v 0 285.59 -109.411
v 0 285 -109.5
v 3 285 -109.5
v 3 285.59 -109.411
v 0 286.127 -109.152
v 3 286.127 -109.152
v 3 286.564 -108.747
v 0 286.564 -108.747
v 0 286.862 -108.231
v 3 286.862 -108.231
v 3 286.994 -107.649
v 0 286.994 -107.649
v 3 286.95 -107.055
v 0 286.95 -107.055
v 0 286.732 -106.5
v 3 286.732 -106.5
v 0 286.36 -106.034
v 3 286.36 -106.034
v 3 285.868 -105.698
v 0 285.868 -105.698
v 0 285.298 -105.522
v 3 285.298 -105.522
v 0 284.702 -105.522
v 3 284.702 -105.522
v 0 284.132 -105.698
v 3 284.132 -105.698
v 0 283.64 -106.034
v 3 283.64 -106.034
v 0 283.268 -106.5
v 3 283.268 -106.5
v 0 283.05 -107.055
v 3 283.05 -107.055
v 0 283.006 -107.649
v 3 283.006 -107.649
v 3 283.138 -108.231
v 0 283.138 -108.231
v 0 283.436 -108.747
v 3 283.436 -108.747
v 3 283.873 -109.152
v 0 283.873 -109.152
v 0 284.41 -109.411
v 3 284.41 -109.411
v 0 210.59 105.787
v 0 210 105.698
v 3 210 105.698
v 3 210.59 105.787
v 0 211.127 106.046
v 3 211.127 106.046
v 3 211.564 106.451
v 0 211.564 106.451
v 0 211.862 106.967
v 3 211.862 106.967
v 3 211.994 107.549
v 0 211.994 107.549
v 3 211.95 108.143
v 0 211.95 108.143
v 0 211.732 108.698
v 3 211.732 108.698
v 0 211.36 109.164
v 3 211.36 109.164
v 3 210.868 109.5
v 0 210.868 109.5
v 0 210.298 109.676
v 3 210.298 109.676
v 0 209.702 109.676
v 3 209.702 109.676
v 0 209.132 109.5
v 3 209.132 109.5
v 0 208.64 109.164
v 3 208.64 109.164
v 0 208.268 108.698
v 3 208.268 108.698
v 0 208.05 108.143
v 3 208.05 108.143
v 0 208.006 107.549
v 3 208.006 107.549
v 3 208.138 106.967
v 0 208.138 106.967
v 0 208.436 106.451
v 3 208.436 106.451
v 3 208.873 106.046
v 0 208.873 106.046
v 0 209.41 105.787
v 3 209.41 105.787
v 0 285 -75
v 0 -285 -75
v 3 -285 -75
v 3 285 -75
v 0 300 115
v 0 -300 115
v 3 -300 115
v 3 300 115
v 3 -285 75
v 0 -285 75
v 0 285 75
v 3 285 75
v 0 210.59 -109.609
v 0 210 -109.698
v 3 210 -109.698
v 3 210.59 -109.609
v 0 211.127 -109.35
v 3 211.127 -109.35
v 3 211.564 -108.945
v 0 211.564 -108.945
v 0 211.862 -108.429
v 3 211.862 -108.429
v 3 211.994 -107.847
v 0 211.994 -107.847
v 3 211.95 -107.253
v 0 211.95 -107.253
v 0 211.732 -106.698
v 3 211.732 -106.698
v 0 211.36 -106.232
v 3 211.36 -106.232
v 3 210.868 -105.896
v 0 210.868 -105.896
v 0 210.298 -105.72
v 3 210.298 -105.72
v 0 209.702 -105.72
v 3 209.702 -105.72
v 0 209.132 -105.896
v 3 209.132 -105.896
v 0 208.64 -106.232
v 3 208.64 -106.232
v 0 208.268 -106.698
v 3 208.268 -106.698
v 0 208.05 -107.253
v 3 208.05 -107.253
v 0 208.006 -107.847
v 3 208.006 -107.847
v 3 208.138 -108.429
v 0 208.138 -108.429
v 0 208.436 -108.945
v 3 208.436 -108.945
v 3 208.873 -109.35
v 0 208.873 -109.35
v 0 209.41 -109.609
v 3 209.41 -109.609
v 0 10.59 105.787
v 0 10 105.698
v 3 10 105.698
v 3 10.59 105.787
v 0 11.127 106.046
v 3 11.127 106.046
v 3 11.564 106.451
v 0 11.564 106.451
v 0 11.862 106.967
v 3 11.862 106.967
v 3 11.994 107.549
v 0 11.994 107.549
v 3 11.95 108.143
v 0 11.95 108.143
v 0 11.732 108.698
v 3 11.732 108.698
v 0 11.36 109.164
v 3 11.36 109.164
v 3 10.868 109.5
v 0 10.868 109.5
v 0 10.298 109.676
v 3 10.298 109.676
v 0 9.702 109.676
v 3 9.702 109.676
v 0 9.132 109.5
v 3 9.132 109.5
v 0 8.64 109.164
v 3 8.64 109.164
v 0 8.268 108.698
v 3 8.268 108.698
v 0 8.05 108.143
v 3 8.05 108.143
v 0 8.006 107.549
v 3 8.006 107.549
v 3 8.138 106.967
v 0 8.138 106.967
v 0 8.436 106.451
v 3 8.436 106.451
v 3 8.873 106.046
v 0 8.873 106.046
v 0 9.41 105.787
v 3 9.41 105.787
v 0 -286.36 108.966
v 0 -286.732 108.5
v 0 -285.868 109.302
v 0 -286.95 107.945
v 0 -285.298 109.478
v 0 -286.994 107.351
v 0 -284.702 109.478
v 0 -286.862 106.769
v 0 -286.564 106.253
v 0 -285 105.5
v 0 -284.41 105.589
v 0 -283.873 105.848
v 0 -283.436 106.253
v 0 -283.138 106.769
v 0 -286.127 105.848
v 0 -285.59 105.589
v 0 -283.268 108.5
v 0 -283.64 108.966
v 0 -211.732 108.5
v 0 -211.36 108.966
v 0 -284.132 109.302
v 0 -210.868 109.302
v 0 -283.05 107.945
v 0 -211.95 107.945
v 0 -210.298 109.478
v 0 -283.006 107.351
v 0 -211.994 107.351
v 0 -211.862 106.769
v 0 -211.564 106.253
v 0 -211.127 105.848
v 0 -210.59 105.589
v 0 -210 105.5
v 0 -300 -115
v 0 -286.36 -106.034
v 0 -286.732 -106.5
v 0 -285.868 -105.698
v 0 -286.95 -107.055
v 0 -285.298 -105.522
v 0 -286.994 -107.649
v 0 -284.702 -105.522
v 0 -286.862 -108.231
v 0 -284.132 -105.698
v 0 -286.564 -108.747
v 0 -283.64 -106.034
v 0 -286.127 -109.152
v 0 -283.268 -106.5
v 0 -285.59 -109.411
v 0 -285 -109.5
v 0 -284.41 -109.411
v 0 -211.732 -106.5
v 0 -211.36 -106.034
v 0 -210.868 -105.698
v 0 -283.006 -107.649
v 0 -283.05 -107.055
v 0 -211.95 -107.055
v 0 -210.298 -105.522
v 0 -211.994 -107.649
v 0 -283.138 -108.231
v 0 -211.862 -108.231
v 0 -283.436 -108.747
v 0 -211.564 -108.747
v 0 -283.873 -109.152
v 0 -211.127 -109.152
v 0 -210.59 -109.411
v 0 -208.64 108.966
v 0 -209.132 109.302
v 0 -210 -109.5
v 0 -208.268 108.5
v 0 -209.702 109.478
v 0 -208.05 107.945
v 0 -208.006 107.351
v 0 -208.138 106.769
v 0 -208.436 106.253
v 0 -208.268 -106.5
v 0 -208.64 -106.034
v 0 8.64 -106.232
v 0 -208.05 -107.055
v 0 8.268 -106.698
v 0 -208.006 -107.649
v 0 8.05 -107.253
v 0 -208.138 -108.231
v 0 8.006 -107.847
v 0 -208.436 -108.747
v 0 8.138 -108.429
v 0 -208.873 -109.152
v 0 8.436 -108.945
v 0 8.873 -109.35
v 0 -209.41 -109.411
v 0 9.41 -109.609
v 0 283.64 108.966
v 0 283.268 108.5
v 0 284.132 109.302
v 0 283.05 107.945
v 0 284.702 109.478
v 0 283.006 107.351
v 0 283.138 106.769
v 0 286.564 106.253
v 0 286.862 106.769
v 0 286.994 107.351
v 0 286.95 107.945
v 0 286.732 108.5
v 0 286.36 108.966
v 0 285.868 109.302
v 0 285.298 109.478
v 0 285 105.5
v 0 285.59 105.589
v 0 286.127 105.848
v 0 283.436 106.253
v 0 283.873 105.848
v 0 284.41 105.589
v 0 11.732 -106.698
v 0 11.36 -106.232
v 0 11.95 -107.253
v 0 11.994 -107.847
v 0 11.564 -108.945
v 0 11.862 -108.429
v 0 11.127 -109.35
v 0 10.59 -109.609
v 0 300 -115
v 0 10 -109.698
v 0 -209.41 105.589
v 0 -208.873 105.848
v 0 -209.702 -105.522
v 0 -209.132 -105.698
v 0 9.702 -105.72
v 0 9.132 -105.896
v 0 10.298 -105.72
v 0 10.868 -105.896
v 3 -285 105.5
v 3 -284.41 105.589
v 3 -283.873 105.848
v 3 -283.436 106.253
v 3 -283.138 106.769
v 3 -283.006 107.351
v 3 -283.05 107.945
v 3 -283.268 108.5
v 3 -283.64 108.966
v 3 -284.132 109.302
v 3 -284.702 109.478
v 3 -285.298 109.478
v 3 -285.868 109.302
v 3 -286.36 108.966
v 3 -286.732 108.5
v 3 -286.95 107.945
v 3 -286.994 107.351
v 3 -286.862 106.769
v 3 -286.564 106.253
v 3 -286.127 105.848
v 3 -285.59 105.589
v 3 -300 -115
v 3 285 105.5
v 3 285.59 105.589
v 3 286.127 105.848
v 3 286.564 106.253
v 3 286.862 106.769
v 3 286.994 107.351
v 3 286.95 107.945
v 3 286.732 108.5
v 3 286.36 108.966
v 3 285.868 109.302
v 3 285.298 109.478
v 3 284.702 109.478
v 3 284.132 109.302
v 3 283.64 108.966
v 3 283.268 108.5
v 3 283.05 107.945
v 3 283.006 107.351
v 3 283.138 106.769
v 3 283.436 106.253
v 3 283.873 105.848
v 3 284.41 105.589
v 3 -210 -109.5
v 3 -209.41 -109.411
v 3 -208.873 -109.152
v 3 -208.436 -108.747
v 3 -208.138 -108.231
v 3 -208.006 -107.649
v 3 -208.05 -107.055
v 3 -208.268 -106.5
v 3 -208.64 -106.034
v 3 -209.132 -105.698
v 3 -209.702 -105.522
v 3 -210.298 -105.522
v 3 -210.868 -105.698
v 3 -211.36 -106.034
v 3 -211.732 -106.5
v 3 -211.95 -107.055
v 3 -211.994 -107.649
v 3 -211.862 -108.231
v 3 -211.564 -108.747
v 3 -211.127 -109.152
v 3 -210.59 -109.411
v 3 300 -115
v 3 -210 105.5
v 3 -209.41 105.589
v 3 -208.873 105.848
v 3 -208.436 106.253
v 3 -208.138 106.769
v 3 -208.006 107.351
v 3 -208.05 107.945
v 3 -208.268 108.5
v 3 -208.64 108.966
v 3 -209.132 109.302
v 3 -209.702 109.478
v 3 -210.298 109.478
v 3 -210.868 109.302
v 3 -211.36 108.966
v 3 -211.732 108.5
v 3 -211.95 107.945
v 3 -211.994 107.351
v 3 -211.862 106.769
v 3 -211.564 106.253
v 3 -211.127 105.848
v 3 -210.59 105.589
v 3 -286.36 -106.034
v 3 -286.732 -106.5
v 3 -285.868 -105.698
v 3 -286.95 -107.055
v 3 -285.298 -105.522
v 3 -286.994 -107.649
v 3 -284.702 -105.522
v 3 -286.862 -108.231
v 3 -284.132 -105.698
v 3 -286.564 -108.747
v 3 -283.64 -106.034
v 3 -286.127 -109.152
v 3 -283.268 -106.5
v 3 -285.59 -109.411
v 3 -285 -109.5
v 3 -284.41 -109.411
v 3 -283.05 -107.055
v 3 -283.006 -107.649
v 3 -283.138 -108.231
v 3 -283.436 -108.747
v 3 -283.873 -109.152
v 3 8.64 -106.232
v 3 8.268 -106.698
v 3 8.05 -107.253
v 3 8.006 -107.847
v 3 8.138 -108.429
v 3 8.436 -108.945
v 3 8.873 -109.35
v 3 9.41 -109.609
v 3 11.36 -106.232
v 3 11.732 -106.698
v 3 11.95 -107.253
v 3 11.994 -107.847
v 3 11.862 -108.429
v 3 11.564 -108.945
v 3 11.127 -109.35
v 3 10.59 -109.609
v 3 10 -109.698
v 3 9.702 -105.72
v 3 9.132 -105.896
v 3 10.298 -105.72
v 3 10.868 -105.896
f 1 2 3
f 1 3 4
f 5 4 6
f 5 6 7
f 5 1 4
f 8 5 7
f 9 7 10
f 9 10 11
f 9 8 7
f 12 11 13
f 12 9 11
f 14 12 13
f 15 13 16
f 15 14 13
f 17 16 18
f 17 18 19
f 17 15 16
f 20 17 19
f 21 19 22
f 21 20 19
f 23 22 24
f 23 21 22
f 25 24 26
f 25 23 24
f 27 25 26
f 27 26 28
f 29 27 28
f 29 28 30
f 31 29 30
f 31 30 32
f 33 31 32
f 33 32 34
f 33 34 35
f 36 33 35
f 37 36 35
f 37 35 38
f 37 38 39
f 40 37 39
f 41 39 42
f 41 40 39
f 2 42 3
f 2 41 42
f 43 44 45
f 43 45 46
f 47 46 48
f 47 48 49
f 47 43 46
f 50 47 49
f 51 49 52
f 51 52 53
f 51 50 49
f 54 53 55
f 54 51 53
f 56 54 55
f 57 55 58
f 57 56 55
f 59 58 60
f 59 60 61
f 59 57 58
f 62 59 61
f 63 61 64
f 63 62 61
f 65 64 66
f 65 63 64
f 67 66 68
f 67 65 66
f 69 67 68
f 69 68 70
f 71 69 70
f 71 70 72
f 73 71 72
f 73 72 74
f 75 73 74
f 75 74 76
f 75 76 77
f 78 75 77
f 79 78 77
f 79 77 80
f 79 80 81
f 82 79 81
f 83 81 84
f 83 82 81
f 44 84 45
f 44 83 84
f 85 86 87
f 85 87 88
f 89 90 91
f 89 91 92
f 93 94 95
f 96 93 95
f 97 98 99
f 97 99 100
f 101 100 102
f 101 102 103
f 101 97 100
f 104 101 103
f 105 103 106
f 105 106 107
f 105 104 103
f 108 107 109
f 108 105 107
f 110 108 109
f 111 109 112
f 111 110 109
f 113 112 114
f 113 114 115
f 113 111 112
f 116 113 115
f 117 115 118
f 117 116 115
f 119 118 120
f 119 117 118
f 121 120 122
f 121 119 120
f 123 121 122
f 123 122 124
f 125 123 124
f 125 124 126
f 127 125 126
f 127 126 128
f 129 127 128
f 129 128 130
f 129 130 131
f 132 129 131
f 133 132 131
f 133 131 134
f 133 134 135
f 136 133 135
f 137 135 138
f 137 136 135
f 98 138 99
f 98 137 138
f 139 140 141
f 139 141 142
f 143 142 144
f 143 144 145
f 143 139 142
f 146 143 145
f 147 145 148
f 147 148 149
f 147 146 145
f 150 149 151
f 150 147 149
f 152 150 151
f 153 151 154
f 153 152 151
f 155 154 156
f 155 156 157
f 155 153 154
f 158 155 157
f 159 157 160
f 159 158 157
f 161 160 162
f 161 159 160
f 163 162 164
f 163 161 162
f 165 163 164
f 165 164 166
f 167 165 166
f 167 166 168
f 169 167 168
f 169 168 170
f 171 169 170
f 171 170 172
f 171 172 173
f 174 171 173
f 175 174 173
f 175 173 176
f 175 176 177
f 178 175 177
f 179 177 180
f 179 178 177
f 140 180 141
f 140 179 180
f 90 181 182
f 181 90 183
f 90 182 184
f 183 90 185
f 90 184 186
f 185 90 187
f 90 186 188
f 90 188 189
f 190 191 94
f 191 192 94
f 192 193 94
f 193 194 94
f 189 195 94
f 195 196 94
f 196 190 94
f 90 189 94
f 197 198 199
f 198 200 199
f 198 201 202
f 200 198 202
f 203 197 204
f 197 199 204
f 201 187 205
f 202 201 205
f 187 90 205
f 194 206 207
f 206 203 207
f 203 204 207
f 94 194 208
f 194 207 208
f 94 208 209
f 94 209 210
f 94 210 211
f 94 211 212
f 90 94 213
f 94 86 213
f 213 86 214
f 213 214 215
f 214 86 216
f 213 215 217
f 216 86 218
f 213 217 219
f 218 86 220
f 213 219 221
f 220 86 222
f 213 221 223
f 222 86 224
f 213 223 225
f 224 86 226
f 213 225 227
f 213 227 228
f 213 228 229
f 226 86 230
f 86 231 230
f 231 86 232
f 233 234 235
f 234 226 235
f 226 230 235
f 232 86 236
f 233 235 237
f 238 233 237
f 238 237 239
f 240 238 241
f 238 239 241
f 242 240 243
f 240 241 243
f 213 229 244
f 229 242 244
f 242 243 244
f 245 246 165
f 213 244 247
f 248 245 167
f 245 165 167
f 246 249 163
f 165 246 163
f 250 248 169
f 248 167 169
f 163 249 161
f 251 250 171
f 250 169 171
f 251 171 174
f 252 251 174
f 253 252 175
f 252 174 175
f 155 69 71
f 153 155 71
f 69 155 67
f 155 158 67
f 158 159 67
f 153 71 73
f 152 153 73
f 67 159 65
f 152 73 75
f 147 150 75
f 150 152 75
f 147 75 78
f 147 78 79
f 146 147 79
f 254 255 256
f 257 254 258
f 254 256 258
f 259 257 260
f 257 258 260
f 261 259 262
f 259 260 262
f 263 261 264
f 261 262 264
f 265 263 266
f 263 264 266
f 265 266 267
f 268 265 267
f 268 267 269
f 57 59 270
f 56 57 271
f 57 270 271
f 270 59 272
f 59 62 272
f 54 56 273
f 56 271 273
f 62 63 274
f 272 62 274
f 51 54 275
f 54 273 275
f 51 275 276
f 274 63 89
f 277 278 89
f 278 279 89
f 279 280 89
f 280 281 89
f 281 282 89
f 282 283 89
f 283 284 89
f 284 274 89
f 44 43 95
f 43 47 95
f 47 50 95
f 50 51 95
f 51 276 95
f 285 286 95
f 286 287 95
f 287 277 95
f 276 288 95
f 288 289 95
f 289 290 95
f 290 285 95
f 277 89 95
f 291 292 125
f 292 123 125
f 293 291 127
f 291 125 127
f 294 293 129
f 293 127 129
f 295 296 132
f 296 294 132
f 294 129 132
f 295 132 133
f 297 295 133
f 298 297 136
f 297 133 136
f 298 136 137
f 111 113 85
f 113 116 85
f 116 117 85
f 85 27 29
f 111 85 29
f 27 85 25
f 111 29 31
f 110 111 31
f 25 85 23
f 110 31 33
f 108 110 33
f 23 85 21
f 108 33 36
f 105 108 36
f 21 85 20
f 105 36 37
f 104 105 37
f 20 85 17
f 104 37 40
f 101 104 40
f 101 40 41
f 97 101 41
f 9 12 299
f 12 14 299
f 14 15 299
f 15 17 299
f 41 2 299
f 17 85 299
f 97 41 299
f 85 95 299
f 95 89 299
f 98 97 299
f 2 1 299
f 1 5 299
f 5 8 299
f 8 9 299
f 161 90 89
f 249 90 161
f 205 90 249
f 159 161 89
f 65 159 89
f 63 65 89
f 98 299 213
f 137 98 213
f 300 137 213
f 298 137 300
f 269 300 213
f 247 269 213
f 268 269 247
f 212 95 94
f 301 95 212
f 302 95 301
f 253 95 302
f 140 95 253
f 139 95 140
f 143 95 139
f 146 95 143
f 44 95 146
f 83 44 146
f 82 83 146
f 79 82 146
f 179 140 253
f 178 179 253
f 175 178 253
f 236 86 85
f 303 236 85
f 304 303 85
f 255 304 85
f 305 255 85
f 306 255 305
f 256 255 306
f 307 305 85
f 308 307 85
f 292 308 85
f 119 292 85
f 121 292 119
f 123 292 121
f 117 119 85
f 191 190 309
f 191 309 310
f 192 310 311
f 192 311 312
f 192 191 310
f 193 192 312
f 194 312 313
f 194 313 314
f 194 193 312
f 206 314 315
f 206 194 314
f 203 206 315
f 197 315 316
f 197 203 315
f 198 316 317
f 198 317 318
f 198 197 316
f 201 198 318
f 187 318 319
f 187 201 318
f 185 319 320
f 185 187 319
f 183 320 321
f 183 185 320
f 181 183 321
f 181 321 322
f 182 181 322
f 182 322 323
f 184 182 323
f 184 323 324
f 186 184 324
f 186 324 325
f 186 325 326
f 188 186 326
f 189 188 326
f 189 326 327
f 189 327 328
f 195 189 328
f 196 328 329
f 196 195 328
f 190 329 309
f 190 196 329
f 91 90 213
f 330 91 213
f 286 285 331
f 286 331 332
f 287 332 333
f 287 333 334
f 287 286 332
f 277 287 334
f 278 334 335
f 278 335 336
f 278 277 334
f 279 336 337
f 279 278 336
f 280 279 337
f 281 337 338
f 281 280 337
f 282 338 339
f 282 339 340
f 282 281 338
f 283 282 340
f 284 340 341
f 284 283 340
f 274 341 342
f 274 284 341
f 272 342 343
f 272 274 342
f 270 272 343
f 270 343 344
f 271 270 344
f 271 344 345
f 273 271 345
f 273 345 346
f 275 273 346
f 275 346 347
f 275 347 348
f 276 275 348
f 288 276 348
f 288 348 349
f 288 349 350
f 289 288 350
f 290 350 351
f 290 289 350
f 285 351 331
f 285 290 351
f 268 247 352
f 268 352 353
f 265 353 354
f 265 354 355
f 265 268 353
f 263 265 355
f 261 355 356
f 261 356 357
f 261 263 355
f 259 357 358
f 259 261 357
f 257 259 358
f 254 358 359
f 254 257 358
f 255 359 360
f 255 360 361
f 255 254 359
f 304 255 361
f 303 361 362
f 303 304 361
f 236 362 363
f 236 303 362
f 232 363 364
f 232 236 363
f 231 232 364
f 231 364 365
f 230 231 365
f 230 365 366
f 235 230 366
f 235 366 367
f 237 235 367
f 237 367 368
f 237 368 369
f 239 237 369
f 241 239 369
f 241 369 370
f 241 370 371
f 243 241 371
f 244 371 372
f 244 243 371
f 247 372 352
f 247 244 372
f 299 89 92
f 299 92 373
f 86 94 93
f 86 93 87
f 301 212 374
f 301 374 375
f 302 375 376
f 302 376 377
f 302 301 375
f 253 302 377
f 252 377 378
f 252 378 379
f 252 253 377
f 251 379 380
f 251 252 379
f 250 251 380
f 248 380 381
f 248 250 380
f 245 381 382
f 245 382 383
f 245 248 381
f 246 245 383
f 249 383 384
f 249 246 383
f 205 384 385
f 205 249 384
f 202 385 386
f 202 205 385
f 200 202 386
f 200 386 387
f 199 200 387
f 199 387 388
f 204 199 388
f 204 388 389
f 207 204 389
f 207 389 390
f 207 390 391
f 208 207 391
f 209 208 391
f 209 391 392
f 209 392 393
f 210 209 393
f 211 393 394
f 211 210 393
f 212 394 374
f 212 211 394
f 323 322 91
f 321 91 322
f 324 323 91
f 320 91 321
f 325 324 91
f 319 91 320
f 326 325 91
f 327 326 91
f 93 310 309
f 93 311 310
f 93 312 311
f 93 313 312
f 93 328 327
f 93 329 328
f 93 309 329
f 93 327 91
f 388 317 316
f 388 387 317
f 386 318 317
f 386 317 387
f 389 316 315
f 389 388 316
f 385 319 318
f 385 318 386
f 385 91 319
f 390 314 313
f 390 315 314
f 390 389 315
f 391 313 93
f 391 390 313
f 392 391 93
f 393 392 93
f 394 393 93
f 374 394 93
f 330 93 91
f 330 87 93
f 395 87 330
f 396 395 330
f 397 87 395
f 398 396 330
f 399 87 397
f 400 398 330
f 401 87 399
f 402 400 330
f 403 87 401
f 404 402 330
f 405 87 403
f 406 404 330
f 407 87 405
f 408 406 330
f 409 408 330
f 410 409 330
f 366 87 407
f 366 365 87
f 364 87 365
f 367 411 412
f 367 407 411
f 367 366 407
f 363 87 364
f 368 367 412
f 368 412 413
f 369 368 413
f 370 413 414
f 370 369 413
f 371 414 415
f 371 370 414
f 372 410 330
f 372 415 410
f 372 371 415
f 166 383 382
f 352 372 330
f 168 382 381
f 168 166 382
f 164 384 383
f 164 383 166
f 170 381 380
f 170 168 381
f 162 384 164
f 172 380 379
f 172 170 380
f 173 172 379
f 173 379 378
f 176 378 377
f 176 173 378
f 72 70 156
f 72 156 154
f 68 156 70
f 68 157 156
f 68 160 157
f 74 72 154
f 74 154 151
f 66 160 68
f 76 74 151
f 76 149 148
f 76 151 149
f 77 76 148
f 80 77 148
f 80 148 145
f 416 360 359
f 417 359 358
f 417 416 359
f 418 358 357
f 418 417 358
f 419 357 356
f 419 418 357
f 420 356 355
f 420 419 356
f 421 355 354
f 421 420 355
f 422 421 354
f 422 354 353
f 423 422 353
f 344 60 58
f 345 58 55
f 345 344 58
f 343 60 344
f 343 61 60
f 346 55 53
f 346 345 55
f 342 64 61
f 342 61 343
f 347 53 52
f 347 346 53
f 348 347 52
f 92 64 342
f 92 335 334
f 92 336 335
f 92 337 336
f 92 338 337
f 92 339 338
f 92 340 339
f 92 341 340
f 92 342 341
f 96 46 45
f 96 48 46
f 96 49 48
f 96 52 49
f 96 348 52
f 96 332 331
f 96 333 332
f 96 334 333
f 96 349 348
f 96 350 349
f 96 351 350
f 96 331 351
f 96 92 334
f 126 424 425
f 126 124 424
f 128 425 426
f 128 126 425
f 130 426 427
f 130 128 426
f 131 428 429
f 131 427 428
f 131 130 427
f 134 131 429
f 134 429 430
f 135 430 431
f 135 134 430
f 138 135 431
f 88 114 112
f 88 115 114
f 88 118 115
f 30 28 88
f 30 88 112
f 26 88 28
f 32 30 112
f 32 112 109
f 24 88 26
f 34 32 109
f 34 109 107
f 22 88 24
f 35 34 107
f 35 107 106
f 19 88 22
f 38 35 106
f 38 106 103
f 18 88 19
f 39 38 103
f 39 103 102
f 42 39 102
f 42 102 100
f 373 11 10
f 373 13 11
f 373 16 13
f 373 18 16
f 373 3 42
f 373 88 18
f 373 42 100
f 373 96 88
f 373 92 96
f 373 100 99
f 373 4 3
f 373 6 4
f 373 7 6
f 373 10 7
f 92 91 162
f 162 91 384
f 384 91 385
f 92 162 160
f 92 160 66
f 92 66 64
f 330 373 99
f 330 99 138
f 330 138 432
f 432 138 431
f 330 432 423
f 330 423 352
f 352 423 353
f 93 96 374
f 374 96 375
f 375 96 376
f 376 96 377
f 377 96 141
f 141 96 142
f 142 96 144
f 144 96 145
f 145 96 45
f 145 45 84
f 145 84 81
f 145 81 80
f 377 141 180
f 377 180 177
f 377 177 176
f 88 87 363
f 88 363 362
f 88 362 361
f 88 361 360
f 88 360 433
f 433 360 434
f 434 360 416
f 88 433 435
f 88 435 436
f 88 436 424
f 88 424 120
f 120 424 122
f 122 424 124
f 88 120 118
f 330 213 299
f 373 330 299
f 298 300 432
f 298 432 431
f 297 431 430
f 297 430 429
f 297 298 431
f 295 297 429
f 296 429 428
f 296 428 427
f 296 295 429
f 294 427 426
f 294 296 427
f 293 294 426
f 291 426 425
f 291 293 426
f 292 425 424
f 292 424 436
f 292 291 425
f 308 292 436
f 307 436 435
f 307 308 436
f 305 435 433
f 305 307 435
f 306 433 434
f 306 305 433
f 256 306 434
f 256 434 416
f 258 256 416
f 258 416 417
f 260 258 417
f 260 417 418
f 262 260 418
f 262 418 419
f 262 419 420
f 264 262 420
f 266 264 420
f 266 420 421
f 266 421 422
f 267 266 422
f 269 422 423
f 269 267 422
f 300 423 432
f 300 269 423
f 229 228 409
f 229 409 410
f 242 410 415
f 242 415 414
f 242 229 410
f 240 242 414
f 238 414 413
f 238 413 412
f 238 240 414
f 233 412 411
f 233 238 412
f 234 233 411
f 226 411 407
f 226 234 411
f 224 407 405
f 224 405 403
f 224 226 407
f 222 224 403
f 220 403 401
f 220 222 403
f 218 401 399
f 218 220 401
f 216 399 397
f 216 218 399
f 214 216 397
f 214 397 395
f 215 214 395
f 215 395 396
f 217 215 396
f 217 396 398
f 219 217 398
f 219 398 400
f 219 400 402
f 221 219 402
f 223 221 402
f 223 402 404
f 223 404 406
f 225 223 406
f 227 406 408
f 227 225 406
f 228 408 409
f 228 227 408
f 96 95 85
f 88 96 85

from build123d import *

# Parameters (mm, degrees)
SKETCH_1_W      = 230
SKETCH_1_H      = 600
SKETCH_1_R      = 2
SKETCH_1_W_2    = 150
SKETCH_1_H_2    = 570
EXTRUDE_1_DEPTH = 3


with BuildPart() as part:
    # 草图1 → 凸台-拉伸1 (new body)
    with BuildSketch(Plane(origin=(0, 0, 0), x_dir=(0, 0, -1), z_dir=(1, 0, 0))):
        Rectangle(SKETCH_1_W, SKETCH_1_H)
        with Locations((-107.5, 285)):
            Circle(SKETCH_1_R, mode=Mode.SUBTRACT)
        with Locations((-107.698004772, 210)):
            Circle(SKETCH_1_R, mode=Mode.SUBTRACT)
        with Locations((-107.5, -210)):
            Circle(SKETCH_1_R, mode=Mode.SUBTRACT)
        with Locations((-107.5, -285)):
            Circle(SKETCH_1_R, mode=Mode.SUBTRACT)
        with Locations((-107.698004772, 10)):
            Circle(SKETCH_1_R, mode=Mode.SUBTRACT)
        with Locations((107.5, -285)):
            Circle(SKETCH_1_R, mode=Mode.SUBTRACT)
        with Locations((107.5, -210)):
            Circle(SKETCH_1_R, mode=Mode.SUBTRACT)
        with Locations((107.698004772, 210)):
            Circle(SKETCH_1_R, mode=Mode.SUBTRACT)
        with Locations((107.5, 285)):
            Circle(SKETCH_1_R, mode=Mode.SUBTRACT)
        with Locations((107.698004772, 10)):
            Circle(SKETCH_1_R, mode=Mode.SUBTRACT)
        Rectangle(SKETCH_1_W_2, SKETCH_1_H_2, mode=Mode.SUBTRACT)
    extrude(amount=EXTRUDE_1_DEPTH)


solid = part.part
